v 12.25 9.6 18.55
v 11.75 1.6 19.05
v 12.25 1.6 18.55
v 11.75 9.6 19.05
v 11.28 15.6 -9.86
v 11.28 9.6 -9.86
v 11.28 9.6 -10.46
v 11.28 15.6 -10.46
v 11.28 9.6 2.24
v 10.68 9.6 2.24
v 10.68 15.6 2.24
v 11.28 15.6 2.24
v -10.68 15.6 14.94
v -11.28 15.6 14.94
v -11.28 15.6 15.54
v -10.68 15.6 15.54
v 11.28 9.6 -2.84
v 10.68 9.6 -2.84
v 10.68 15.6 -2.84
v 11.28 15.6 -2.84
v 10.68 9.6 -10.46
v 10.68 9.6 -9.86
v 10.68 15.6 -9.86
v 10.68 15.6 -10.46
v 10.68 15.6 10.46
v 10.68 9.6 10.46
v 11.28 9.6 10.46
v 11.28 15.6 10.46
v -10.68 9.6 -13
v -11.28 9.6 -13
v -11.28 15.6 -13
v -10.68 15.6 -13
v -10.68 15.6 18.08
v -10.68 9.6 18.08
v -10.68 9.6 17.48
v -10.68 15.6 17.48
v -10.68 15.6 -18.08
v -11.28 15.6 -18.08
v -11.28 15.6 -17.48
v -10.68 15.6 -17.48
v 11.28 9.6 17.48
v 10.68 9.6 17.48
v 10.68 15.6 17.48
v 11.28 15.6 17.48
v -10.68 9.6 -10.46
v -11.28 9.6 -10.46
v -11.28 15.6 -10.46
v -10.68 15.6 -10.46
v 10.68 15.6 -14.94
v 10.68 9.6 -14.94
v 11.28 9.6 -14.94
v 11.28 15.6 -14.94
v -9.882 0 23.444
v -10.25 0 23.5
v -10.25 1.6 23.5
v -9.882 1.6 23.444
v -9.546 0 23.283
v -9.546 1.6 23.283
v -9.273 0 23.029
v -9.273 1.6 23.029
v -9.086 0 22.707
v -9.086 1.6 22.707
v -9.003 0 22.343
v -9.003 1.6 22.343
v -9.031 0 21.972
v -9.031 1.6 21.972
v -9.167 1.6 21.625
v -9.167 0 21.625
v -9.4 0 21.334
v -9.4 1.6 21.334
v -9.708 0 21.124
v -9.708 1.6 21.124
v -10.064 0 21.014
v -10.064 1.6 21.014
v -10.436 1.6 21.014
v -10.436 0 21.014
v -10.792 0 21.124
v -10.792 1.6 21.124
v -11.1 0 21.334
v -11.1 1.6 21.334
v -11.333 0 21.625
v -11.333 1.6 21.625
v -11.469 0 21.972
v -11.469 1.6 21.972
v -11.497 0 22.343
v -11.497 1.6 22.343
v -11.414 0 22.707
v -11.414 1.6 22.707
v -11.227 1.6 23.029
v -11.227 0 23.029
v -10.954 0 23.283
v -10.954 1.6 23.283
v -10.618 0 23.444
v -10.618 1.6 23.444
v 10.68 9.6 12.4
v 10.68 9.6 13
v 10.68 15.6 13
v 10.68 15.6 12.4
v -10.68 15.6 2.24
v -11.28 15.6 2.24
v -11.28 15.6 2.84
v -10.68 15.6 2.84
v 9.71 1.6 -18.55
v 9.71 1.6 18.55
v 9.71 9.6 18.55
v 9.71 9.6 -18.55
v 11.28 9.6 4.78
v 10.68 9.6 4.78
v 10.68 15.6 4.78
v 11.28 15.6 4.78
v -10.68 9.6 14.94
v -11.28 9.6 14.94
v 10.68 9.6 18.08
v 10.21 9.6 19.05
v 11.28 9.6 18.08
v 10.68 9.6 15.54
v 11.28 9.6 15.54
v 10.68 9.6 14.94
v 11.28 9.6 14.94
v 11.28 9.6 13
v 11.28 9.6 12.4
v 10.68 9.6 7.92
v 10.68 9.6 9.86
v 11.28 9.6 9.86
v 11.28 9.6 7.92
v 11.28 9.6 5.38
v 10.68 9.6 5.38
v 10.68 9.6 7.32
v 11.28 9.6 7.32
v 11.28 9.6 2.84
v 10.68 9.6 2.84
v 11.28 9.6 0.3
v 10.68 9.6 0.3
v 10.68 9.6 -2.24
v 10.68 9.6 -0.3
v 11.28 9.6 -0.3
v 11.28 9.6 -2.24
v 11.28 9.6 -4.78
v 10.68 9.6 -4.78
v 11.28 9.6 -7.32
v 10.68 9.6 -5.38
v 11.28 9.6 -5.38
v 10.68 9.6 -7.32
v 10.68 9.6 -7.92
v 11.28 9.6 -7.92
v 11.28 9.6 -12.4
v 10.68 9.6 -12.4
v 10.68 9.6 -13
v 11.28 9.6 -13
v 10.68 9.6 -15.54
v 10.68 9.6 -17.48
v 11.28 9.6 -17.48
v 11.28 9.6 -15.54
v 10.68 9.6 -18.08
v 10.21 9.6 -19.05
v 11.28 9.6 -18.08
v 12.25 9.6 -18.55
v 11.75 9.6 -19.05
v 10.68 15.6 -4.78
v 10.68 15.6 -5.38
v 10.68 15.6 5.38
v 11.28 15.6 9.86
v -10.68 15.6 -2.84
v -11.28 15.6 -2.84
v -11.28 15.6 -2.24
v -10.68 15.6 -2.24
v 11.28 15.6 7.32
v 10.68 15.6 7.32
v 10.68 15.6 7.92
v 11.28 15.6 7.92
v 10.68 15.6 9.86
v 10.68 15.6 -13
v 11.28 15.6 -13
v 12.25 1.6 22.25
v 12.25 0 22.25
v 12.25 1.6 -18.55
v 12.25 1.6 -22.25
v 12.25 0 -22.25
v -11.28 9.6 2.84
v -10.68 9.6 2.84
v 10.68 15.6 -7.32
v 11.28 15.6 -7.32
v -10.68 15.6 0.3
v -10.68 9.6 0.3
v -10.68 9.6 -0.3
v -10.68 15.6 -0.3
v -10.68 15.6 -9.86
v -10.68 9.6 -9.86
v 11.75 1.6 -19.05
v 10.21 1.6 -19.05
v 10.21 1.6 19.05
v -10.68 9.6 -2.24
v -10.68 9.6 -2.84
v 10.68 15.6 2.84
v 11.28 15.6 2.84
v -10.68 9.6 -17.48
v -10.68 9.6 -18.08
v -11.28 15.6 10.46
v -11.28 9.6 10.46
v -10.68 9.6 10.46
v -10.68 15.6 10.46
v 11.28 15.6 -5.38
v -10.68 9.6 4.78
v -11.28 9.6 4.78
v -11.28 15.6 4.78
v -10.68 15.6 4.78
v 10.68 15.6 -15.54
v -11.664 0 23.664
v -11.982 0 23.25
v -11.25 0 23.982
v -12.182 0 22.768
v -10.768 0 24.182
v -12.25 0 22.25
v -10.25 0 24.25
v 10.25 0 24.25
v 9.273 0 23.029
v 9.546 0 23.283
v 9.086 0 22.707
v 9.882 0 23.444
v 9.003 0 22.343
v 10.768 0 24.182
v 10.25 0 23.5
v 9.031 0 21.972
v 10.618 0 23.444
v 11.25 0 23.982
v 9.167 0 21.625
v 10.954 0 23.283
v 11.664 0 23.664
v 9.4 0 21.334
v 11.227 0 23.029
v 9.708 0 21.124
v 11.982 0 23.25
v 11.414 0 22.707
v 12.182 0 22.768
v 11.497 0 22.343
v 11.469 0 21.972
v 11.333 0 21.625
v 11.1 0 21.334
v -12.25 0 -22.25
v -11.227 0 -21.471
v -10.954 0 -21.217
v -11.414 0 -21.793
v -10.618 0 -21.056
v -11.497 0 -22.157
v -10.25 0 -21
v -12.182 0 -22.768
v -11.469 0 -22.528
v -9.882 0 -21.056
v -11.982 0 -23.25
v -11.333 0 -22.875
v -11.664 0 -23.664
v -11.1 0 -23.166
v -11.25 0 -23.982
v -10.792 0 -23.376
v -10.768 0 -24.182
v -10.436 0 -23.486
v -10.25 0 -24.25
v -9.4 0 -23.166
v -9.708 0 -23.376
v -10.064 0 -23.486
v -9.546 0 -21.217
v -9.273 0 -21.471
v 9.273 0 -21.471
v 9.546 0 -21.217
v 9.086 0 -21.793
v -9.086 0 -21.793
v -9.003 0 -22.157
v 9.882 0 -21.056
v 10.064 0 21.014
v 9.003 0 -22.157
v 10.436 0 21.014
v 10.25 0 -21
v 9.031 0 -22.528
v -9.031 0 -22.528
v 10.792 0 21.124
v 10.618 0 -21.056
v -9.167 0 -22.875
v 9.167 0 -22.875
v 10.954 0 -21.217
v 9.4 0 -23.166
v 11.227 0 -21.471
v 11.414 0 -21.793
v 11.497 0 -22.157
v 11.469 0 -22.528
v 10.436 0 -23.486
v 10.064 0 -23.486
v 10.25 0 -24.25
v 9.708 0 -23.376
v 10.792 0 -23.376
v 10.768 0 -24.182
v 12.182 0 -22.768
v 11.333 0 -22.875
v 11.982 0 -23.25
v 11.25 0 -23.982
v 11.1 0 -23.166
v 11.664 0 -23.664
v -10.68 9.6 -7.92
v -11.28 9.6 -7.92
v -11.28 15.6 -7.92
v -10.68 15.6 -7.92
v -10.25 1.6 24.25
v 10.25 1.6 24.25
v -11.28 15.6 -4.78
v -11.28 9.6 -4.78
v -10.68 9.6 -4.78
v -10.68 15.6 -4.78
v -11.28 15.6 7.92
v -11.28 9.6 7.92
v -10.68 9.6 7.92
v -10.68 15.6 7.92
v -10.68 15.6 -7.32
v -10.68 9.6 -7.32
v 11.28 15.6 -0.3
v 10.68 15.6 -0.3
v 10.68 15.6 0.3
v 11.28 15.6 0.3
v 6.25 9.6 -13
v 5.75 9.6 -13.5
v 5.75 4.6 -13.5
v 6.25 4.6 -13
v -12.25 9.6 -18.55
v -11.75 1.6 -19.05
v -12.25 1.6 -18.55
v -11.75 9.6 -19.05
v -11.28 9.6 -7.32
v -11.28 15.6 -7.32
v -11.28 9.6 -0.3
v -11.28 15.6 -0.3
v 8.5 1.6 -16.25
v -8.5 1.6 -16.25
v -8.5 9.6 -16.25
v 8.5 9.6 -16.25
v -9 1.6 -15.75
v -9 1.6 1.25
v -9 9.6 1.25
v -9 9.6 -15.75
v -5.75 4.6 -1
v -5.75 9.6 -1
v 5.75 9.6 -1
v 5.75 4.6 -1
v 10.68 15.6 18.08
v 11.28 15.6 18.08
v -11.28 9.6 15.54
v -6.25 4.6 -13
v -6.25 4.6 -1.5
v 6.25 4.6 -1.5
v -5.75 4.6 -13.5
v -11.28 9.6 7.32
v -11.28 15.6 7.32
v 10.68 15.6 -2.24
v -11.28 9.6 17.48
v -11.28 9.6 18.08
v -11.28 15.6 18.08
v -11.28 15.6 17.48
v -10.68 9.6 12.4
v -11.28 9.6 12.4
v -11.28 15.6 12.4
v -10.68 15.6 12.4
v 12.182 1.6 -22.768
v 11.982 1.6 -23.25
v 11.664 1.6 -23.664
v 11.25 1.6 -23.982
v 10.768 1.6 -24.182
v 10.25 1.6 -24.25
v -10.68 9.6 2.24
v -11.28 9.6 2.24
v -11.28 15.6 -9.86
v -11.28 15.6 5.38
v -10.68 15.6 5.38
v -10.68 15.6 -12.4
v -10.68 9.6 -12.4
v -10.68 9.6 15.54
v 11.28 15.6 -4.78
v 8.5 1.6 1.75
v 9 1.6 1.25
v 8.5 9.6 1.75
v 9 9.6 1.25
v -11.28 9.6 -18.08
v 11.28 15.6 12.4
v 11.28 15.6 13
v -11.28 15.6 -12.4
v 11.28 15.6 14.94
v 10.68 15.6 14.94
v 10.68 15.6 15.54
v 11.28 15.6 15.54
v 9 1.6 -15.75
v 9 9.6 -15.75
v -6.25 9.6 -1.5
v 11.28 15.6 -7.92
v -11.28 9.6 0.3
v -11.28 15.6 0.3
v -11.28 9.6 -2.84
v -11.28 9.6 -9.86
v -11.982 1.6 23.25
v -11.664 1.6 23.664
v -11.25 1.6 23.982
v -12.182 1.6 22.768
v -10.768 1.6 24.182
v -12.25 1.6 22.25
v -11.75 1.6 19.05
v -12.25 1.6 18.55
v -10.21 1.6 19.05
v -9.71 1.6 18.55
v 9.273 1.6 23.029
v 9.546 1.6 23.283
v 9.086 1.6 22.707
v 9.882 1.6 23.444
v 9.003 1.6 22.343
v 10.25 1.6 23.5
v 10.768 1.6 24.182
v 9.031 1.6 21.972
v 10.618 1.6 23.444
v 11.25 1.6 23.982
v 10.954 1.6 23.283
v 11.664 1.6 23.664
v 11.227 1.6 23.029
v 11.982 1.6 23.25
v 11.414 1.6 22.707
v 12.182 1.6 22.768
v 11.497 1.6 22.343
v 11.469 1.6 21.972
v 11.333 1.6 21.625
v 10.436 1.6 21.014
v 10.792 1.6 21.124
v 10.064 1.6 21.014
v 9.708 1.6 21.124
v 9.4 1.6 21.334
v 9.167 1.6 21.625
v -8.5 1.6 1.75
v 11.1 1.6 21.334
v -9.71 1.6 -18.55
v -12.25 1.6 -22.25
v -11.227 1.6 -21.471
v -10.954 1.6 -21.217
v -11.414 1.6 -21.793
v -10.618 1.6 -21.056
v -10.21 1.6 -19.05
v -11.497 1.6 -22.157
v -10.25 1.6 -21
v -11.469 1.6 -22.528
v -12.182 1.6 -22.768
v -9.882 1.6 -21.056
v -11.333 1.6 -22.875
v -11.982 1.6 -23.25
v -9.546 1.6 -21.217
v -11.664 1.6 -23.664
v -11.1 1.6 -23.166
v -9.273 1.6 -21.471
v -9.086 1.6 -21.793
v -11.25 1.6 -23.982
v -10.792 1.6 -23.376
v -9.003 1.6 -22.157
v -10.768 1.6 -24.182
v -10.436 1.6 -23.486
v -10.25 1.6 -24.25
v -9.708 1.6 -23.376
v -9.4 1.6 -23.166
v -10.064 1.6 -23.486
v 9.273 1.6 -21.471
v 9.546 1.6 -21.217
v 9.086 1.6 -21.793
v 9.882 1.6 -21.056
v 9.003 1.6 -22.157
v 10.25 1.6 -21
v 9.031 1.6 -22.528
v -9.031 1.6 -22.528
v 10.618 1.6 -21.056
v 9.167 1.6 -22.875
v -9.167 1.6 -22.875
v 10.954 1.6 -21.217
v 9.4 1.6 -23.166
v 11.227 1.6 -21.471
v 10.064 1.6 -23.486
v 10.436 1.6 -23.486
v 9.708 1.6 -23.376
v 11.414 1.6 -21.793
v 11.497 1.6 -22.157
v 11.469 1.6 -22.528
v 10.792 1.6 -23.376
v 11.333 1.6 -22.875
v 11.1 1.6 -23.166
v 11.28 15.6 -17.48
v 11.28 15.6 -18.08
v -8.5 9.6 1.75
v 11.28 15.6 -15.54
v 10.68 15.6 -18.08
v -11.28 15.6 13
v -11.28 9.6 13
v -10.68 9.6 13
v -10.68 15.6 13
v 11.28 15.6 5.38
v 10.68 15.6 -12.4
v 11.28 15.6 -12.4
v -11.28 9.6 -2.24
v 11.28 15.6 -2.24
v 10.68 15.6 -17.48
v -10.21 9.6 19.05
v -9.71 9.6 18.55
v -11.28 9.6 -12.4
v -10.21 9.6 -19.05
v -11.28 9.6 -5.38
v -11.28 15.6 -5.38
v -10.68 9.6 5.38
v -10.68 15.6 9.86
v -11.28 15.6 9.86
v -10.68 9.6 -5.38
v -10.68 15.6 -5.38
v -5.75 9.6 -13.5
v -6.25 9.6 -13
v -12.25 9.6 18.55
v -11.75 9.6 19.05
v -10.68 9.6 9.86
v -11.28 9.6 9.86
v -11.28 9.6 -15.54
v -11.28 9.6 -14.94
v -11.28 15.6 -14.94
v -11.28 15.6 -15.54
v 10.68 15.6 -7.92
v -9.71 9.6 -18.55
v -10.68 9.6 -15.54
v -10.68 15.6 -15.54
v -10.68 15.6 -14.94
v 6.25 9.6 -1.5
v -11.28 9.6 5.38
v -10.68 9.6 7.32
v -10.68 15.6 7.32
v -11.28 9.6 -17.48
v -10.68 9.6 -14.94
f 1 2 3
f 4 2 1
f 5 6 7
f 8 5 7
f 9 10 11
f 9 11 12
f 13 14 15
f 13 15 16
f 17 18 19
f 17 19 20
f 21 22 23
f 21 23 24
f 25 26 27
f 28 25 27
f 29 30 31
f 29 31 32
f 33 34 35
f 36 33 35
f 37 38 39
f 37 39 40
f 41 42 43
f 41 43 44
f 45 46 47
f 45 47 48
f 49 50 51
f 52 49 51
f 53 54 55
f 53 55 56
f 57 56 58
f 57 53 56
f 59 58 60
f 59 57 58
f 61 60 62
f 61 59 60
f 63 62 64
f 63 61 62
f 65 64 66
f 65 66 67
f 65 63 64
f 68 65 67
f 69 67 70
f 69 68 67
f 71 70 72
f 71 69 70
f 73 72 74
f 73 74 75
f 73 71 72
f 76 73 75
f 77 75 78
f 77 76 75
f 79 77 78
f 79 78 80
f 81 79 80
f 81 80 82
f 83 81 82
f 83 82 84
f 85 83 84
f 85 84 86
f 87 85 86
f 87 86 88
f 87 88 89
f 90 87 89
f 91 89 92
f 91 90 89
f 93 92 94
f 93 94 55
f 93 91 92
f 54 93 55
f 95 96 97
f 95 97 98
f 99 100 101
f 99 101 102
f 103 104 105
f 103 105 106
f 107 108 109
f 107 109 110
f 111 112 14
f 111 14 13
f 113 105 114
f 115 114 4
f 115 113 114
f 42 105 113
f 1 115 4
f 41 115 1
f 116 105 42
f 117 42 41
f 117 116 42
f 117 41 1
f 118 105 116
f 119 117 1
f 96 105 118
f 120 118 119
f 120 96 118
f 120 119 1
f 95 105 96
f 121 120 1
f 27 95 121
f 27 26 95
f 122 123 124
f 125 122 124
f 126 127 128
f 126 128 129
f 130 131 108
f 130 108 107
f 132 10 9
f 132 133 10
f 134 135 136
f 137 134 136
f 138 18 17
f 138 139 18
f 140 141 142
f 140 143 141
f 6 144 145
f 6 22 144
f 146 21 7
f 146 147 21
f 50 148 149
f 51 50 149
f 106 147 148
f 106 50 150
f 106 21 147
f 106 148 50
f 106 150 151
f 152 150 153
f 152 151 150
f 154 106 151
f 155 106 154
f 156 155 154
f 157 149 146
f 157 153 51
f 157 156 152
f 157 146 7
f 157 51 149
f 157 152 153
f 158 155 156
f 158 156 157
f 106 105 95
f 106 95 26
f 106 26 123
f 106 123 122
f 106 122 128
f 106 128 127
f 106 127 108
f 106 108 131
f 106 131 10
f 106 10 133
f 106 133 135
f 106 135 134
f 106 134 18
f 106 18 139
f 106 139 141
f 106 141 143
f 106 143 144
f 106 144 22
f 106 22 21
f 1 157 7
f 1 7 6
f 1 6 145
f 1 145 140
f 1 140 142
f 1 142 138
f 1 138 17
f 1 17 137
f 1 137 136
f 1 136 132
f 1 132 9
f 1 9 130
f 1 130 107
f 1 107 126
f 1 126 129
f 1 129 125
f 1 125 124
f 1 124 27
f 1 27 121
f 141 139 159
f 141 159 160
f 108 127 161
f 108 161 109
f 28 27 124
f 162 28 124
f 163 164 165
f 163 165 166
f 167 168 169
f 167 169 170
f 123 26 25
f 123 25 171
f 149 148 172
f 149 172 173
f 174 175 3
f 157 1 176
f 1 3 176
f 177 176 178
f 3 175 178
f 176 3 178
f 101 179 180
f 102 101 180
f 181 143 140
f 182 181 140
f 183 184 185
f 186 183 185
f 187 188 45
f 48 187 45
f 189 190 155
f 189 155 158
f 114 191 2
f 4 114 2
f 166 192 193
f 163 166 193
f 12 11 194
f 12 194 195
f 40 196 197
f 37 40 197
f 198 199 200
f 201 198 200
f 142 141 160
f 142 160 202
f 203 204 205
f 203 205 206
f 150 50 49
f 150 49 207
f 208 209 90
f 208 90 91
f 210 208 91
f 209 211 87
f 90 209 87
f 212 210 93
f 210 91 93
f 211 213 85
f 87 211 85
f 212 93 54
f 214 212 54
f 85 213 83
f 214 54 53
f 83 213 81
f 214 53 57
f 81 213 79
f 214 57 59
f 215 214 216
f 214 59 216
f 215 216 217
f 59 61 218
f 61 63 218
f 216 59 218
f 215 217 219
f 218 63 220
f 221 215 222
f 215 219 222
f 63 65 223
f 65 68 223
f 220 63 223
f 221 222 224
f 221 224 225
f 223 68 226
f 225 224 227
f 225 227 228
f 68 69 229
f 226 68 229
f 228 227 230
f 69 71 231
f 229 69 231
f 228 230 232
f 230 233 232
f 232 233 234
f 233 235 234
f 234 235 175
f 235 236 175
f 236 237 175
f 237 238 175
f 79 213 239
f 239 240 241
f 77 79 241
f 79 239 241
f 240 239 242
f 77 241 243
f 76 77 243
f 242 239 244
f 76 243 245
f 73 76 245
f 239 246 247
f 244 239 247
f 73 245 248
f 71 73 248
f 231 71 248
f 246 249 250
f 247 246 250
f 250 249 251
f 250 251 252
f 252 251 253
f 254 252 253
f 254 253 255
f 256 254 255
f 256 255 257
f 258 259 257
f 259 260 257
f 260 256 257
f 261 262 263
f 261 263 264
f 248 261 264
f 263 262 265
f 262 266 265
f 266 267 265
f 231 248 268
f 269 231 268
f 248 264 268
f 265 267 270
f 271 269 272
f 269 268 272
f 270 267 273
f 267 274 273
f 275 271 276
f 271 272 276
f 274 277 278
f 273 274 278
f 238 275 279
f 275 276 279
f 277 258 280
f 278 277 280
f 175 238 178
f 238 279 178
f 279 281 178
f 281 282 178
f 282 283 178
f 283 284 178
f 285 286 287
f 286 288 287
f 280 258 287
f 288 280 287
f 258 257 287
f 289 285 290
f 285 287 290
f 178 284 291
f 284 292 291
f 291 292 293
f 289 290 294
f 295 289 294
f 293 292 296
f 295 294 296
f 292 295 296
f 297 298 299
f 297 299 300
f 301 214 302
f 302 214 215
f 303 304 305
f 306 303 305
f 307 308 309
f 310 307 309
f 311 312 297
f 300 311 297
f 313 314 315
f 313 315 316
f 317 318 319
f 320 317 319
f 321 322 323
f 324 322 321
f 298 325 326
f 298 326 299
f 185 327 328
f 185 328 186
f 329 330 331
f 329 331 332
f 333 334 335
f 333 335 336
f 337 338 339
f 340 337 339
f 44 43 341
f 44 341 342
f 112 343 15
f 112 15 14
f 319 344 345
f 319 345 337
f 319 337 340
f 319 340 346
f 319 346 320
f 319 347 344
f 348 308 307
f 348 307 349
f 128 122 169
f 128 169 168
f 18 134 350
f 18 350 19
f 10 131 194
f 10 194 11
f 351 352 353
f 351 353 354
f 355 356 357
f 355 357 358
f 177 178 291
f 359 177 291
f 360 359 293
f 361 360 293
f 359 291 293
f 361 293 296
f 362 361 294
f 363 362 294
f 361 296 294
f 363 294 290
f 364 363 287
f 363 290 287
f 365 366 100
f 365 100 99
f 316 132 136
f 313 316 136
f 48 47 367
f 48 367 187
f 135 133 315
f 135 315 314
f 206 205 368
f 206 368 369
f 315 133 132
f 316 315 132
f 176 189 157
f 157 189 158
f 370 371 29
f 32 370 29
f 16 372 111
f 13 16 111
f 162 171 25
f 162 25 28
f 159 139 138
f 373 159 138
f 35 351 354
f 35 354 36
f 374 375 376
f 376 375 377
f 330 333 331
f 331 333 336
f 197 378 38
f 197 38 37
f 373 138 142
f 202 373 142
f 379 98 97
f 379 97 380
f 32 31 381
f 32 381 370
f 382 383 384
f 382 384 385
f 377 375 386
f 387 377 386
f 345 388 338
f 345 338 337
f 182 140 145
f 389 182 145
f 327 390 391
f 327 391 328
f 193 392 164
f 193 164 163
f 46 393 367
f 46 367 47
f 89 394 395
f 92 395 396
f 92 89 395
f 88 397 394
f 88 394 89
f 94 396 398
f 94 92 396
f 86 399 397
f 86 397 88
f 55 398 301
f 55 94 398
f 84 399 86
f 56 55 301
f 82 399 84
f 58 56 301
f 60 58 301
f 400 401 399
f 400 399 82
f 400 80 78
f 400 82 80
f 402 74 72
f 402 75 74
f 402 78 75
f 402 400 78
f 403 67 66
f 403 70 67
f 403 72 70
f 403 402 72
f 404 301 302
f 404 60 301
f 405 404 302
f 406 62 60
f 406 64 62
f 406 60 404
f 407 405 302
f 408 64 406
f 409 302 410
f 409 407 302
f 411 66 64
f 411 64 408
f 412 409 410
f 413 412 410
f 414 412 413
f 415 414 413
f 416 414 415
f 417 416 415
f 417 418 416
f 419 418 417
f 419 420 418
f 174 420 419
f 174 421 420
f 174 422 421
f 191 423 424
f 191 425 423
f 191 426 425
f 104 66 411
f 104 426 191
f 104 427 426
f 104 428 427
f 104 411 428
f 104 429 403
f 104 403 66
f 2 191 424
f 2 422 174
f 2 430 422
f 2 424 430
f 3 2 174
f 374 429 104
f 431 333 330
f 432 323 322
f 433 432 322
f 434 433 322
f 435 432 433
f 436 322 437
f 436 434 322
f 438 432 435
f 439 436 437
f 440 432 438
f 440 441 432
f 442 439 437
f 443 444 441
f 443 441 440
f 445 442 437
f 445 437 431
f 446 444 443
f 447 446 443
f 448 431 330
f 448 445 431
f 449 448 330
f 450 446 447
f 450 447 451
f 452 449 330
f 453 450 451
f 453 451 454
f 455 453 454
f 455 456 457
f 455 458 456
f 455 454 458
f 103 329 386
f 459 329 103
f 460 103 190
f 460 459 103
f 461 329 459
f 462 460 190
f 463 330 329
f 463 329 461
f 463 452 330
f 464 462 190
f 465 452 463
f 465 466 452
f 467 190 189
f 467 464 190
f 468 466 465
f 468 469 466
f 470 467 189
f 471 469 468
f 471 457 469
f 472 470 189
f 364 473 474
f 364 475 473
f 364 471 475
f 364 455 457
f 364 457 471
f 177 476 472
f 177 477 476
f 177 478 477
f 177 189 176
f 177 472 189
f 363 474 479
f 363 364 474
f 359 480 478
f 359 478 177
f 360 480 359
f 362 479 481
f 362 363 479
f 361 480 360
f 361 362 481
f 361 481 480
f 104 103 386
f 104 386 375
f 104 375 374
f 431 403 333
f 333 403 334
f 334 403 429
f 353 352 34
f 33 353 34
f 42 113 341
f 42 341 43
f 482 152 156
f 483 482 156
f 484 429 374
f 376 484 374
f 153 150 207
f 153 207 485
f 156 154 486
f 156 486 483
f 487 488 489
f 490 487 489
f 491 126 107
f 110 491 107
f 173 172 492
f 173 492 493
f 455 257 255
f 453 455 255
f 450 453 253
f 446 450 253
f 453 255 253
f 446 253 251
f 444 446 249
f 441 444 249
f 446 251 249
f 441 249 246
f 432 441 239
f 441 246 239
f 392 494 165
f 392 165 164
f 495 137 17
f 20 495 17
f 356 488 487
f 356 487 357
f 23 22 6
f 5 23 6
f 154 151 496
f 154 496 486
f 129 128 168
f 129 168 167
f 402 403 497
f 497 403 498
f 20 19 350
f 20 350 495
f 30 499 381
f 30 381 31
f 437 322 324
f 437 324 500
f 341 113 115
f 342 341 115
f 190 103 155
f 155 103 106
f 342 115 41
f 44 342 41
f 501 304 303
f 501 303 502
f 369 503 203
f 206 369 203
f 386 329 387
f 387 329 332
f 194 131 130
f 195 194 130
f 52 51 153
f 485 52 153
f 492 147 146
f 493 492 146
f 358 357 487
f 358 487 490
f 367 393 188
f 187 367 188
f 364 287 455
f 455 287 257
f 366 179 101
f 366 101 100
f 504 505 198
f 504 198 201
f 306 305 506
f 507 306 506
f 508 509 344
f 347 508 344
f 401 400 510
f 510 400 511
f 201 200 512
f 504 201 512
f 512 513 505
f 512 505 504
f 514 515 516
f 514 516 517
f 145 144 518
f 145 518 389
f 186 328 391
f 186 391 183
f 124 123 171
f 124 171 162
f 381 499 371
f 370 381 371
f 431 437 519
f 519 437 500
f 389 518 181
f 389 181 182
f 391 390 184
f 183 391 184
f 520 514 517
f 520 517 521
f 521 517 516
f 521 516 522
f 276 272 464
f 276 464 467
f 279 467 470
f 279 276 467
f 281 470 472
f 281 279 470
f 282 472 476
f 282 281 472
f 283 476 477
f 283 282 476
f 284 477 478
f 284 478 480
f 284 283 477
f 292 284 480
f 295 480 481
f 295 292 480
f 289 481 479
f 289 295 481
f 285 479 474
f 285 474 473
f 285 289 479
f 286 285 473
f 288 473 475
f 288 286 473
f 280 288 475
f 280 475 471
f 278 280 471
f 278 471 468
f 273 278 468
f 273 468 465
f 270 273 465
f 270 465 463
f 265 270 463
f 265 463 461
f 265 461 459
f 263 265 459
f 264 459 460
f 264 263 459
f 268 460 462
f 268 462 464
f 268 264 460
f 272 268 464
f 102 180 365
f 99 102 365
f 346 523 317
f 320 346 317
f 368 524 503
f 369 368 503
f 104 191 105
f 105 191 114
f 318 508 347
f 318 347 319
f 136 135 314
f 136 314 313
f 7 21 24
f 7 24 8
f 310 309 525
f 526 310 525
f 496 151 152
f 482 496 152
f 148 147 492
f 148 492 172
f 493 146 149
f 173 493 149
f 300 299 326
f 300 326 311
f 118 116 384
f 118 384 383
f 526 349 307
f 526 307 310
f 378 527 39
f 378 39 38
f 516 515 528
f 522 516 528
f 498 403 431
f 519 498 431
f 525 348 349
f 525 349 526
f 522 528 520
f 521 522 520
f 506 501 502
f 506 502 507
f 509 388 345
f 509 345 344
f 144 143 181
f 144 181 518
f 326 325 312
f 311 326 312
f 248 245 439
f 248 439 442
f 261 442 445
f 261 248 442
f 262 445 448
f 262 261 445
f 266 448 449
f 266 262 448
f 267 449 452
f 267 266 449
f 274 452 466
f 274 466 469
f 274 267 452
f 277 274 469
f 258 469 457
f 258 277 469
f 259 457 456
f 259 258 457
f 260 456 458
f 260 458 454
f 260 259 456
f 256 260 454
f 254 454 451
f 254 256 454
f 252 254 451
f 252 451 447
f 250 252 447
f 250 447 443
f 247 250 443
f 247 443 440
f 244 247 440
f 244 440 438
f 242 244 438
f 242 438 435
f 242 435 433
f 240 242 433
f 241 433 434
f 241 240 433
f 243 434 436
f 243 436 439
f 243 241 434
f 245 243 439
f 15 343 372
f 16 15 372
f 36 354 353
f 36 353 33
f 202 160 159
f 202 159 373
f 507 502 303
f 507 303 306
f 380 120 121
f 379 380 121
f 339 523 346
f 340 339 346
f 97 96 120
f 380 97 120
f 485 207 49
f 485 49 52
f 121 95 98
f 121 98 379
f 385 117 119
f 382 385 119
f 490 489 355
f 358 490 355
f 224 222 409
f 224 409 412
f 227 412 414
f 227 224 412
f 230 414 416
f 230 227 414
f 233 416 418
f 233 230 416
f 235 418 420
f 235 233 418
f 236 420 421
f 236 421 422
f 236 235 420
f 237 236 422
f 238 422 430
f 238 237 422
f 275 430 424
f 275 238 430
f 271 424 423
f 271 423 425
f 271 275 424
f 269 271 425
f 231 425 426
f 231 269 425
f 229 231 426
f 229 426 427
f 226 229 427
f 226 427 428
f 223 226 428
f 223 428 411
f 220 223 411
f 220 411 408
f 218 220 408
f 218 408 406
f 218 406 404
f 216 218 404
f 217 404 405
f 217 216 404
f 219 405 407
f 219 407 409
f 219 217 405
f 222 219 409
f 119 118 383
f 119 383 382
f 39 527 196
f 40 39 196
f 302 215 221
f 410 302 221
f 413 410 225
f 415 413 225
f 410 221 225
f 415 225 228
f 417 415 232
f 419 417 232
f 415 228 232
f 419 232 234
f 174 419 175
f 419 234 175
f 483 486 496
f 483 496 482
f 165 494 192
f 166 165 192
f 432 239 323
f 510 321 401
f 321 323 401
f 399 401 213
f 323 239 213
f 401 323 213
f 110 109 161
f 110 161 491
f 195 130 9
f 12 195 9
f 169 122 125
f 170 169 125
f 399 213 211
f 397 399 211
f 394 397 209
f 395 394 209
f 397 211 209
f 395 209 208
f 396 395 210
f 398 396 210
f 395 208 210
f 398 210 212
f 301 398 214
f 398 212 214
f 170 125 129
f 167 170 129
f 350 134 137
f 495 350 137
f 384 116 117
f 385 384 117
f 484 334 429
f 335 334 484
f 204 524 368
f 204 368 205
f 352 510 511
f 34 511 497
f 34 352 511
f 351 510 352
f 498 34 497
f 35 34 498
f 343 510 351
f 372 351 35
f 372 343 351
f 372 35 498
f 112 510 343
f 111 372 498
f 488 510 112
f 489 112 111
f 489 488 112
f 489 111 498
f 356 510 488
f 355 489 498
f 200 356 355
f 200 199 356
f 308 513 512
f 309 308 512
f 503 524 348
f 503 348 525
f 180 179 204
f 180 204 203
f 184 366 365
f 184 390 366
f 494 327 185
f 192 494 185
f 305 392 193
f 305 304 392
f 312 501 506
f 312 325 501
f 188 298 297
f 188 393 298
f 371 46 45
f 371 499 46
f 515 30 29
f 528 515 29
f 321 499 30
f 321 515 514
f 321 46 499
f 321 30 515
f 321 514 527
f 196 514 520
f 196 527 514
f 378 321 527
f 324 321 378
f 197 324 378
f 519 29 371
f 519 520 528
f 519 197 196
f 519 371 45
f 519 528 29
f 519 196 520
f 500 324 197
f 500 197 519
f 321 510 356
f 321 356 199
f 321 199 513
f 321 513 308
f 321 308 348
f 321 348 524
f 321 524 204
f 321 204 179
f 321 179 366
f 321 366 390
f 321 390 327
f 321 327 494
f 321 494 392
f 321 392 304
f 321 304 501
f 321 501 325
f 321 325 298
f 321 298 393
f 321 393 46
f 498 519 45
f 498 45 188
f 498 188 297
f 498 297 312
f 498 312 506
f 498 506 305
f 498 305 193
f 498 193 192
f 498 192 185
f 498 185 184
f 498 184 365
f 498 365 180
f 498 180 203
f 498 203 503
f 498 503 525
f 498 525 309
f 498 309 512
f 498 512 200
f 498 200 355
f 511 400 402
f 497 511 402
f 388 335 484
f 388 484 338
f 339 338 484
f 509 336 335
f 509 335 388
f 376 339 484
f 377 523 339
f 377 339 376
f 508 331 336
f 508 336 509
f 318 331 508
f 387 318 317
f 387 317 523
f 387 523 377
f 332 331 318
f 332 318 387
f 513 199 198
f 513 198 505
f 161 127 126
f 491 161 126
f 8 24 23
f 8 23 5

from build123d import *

# Parameters (mm, degrees)
SKETCH_1_R          = 1.25
EXTRUDE_1_DEPTH     = 1.6
SKETCH_2_W          = 18
SKETCH_2_H          = 18
SKETCH_2_W_2        = 2.54
SKETCH_2_H_2        = 38.1
EXTRUDE_2_DEPTH     = 8
SKETCH_4_W          = 12.5
SKETCH_4_H          = 12.5
CUT_EXTRUDE_1_DEPTH = 5
SKETCH_5_W          = 0.6
SKETCH_5_H          = 0.6
EXTRUDE_3_DEPTH     = 6
CHAMFER_1_SIZE      = 0.5


with BuildPart() as part:
    # 草图1 → 凸台-拉伸1 (new body)
    with BuildSketch(Plane(origin=(0, 0, 0), x_dir=(1, 0, 0), z_dir=(0, 1, 0))):
        with BuildLine():
            Line((-10.25, -24.25), (10.25, -24.25))
            ThreePointArc((10.25, -24.25), (11.664213562, -23.664213562), (12.25, -22.25))
            Line((12.25, -22.25), (12.25, 22.25))
            ThreePointArc((12.25, 22.25), (11.664213562, 23.664213562), (10.25, 24.25))
            Line((10.25, 24.25), (-10.25, 24.25))
            ThreePointArc((-10.25, 24.25), (-11.664213562, 23.664213562), (-12.25, 22.25))
            Line((-12.25, 22.25), (-12.25, -22.25))
            ThreePointArc((-12.25, -22.25), (-11.664213562, -23.664213562), (-10.25, -24.25))
        make_face()
        with Locations(Location((-10.25, 22.25, 0), (0, 0, 270))):
            Circle(SKETCH_1_R, mode=Mode.SUBTRACT)
        with Locations(Location((10.25, 22.25, 0), (0, 0, 270))):
            Circle(SKETCH_1_R, mode=Mode.SUBTRACT)
        with Locations(Location((-10.25, -22.25, 0), (0, 0, 270))):
            Circle(SKETCH_1_R, mode=Mode.SUBTRACT)
        with Locations(Location((10.25, -22.25, 0), (0, 0, 270))):
            Circle(SKETCH_1_R, mode=Mode.SUBTRACT)
    extrude(amount=EXTRUDE_1_DEPTH)

    # 草图2 → 凸台-拉伸2 (add)
    with BuildSketch(Plane(origin=(0, 1.6, 0), x_dir=(1, 0, 0), z_dir=(0, 1, 0))):
        with Locations((0, 7.25)):
            Rectangle(SKETCH_2_W, SKETCH_2_H)
        with Locations((-10.98, 0)):
            Rectangle(SKETCH_2_W_2, SKETCH_2_H_2)
        with Locations((10.98, 0)):
            Rectangle(SKETCH_2_W_2, SKETCH_2_H_2)
    extrude(amount=EXTRUDE_2_DEPTH)

    # 草图4 → 切除-拉伸1 (cut)
    with BuildSketch(Plane(origin=(0, 9.6, 0), x_dir=(1, 0, 0), z_dir=(0, 1, 0))):
        with Locations((0, 7.25)):
            Rectangle(SKETCH_4_W, SKETCH_4_H)
    extrude(amount=-CUT_EXTRUDE_1_DEPTH, mode=Mode.SUBTRACT)

    # 草图5 → 凸台-拉伸3 (add)
    with BuildSketch(Plane(origin=(0, 9.6, 0), x_dir=(1, 0, 0), z_dir=(0, 1, 0))):
        with Locations((-10.98, 17.78)):
            Rectangle(SKETCH_5_W, SKETCH_5_H)
        with Locations((-10.98, 15.24)):
            Rectangle(SKETCH_5_W, SKETCH_5_H)
        with Locations((-10.98, 12.7)):
            Rectangle(SKETCH_5_W, SKETCH_5_H)
        with Locations((-10.98, 10.16)):
            Rectangle(SKETCH_5_W, SKETCH_5_H)
        with Locations((-10.98, 7.62)):
            Rectangle(SKETCH_5_W, SKETCH_5_H)
        with Locations((-10.98, 5.08)):
            Rectangle(SKETCH_5_W, SKETCH_5_H)
        with Locations((-10.98, 2.54)):
            Rectangle(SKETCH_5_W, SKETCH_5_H)
        with Locations((-10.98, 0)):
            Rectangle(SKETCH_5_W, SKETCH_5_H)
        with Locations((-10.98, -2.54)):
            Rectangle(SKETCH_5_W, SKETCH_5_H)
        with Locations((-10.98, -5.08)):
            Rectangle(SKETCH_5_W, SKETCH_5_H)
        with Locations((-10.98, -7.62)):
            Rectangle(SKETCH_5_W, SKETCH_5_H)
        with Locations((-10.98, -10.16)):
            Rectangle(SKETCH_5_W, SKETCH_5_H)
        with Locations((-10.98, -12.7)):
            Rectangle(SKETCH_5_W, SKETCH_5_H)
        with Locations((-10.98, -15.24)):
            Rectangle(SKETCH_5_W, SKETCH_5_H)
        with Locations((-10.98, -17.78)):
            Rectangle(SKETCH_5_W, SKETCH_5_H)
        with Locations((10.98, -17.78)):
            Rectangle(SKETCH_5_W, SKETCH_5_H)
        with Locations((10.98, -15.24)):
            Rectangle(SKETCH_5_W, SKETCH_5_H)
        with Locations((10.98, -12.7)):
            Rectangle(SKETCH_5_W, SKETCH_5_H)
        with Locations((10.98, -10.16)):
            Rectangle(SKETCH_5_W, SKETCH_5_H)
        with Locations((10.98, -7.62)):
            Rectangle(SKETCH_5_W, SKETCH_5_H)
        with Locations((10.98, -5.08)):
            Rectangle(SKETCH_5_W, SKETCH_5_H)
        with Locations((10.98, -2.54)):
            Rectangle(SKETCH_5_W, SKETCH_5_H)
        with Locations((10.98, 0)):
            Rectangle(SKETCH_5_W, SKETCH_5_H)
        with Locations((10.98, 2.54)):
            Rectangle(SKETCH_5_W, SKETCH_5_H)
        with Locations((10.98, 5.08)):
            Rectangle(SKETCH_5_W, SKETCH_5_H)
        with Locations((10.98, 7.62)):
            Rectangle(SKETCH_5_W, SKETCH_5_H)
        with Locations((10.98, 10.16)):
            Rectangle(SKETCH_5_W, SKETCH_5_H)
        with Locations((10.98, 12.7)):
            Rectangle(SKETCH_5_W, SKETCH_5_H)
        with Locations((10.98, 15.24)):
            Rectangle(SKETCH_5_W, SKETCH_5_H)
        with Locations((10.98, 17.78)):
            Rectangle(SKETCH_5_W, SKETCH_5_H)
    extrude(amount=EXTRUDE_3_DEPTH)

    # 倒角1
    chamfer_1_edges = [part.edges().sort_by_distance(p)[0] for p in [
        (9, 5.6, 1.75),
        (9, 5.6, -16.25),
        (-9, 5.6, -16.25),
        (-9, 5.6, 1.75),
        (-12.25, 5.6, -19.05),
        (-12.25, 5.6, 19.05),
        (-9.71, 5.6, 19.05),
        (-9.71, 5.6, -19.05),
        (12.25, 5.6, -19.05),
        (9.71, 5.6, -19.05),
        (9.71, 5.6, 19.05),
        (12.25, 5.6, 19.05),
        (6.25, 7.1, -13.5),
        (6.25, 7.1, -1),
        (-6.25, 7.1, -1),
        (-6.25, 7.1, -13.5),
    ]]
    chamfer(chamfer_1_edges, length=CHAMFER_1_SIZE)


solid = part.part
